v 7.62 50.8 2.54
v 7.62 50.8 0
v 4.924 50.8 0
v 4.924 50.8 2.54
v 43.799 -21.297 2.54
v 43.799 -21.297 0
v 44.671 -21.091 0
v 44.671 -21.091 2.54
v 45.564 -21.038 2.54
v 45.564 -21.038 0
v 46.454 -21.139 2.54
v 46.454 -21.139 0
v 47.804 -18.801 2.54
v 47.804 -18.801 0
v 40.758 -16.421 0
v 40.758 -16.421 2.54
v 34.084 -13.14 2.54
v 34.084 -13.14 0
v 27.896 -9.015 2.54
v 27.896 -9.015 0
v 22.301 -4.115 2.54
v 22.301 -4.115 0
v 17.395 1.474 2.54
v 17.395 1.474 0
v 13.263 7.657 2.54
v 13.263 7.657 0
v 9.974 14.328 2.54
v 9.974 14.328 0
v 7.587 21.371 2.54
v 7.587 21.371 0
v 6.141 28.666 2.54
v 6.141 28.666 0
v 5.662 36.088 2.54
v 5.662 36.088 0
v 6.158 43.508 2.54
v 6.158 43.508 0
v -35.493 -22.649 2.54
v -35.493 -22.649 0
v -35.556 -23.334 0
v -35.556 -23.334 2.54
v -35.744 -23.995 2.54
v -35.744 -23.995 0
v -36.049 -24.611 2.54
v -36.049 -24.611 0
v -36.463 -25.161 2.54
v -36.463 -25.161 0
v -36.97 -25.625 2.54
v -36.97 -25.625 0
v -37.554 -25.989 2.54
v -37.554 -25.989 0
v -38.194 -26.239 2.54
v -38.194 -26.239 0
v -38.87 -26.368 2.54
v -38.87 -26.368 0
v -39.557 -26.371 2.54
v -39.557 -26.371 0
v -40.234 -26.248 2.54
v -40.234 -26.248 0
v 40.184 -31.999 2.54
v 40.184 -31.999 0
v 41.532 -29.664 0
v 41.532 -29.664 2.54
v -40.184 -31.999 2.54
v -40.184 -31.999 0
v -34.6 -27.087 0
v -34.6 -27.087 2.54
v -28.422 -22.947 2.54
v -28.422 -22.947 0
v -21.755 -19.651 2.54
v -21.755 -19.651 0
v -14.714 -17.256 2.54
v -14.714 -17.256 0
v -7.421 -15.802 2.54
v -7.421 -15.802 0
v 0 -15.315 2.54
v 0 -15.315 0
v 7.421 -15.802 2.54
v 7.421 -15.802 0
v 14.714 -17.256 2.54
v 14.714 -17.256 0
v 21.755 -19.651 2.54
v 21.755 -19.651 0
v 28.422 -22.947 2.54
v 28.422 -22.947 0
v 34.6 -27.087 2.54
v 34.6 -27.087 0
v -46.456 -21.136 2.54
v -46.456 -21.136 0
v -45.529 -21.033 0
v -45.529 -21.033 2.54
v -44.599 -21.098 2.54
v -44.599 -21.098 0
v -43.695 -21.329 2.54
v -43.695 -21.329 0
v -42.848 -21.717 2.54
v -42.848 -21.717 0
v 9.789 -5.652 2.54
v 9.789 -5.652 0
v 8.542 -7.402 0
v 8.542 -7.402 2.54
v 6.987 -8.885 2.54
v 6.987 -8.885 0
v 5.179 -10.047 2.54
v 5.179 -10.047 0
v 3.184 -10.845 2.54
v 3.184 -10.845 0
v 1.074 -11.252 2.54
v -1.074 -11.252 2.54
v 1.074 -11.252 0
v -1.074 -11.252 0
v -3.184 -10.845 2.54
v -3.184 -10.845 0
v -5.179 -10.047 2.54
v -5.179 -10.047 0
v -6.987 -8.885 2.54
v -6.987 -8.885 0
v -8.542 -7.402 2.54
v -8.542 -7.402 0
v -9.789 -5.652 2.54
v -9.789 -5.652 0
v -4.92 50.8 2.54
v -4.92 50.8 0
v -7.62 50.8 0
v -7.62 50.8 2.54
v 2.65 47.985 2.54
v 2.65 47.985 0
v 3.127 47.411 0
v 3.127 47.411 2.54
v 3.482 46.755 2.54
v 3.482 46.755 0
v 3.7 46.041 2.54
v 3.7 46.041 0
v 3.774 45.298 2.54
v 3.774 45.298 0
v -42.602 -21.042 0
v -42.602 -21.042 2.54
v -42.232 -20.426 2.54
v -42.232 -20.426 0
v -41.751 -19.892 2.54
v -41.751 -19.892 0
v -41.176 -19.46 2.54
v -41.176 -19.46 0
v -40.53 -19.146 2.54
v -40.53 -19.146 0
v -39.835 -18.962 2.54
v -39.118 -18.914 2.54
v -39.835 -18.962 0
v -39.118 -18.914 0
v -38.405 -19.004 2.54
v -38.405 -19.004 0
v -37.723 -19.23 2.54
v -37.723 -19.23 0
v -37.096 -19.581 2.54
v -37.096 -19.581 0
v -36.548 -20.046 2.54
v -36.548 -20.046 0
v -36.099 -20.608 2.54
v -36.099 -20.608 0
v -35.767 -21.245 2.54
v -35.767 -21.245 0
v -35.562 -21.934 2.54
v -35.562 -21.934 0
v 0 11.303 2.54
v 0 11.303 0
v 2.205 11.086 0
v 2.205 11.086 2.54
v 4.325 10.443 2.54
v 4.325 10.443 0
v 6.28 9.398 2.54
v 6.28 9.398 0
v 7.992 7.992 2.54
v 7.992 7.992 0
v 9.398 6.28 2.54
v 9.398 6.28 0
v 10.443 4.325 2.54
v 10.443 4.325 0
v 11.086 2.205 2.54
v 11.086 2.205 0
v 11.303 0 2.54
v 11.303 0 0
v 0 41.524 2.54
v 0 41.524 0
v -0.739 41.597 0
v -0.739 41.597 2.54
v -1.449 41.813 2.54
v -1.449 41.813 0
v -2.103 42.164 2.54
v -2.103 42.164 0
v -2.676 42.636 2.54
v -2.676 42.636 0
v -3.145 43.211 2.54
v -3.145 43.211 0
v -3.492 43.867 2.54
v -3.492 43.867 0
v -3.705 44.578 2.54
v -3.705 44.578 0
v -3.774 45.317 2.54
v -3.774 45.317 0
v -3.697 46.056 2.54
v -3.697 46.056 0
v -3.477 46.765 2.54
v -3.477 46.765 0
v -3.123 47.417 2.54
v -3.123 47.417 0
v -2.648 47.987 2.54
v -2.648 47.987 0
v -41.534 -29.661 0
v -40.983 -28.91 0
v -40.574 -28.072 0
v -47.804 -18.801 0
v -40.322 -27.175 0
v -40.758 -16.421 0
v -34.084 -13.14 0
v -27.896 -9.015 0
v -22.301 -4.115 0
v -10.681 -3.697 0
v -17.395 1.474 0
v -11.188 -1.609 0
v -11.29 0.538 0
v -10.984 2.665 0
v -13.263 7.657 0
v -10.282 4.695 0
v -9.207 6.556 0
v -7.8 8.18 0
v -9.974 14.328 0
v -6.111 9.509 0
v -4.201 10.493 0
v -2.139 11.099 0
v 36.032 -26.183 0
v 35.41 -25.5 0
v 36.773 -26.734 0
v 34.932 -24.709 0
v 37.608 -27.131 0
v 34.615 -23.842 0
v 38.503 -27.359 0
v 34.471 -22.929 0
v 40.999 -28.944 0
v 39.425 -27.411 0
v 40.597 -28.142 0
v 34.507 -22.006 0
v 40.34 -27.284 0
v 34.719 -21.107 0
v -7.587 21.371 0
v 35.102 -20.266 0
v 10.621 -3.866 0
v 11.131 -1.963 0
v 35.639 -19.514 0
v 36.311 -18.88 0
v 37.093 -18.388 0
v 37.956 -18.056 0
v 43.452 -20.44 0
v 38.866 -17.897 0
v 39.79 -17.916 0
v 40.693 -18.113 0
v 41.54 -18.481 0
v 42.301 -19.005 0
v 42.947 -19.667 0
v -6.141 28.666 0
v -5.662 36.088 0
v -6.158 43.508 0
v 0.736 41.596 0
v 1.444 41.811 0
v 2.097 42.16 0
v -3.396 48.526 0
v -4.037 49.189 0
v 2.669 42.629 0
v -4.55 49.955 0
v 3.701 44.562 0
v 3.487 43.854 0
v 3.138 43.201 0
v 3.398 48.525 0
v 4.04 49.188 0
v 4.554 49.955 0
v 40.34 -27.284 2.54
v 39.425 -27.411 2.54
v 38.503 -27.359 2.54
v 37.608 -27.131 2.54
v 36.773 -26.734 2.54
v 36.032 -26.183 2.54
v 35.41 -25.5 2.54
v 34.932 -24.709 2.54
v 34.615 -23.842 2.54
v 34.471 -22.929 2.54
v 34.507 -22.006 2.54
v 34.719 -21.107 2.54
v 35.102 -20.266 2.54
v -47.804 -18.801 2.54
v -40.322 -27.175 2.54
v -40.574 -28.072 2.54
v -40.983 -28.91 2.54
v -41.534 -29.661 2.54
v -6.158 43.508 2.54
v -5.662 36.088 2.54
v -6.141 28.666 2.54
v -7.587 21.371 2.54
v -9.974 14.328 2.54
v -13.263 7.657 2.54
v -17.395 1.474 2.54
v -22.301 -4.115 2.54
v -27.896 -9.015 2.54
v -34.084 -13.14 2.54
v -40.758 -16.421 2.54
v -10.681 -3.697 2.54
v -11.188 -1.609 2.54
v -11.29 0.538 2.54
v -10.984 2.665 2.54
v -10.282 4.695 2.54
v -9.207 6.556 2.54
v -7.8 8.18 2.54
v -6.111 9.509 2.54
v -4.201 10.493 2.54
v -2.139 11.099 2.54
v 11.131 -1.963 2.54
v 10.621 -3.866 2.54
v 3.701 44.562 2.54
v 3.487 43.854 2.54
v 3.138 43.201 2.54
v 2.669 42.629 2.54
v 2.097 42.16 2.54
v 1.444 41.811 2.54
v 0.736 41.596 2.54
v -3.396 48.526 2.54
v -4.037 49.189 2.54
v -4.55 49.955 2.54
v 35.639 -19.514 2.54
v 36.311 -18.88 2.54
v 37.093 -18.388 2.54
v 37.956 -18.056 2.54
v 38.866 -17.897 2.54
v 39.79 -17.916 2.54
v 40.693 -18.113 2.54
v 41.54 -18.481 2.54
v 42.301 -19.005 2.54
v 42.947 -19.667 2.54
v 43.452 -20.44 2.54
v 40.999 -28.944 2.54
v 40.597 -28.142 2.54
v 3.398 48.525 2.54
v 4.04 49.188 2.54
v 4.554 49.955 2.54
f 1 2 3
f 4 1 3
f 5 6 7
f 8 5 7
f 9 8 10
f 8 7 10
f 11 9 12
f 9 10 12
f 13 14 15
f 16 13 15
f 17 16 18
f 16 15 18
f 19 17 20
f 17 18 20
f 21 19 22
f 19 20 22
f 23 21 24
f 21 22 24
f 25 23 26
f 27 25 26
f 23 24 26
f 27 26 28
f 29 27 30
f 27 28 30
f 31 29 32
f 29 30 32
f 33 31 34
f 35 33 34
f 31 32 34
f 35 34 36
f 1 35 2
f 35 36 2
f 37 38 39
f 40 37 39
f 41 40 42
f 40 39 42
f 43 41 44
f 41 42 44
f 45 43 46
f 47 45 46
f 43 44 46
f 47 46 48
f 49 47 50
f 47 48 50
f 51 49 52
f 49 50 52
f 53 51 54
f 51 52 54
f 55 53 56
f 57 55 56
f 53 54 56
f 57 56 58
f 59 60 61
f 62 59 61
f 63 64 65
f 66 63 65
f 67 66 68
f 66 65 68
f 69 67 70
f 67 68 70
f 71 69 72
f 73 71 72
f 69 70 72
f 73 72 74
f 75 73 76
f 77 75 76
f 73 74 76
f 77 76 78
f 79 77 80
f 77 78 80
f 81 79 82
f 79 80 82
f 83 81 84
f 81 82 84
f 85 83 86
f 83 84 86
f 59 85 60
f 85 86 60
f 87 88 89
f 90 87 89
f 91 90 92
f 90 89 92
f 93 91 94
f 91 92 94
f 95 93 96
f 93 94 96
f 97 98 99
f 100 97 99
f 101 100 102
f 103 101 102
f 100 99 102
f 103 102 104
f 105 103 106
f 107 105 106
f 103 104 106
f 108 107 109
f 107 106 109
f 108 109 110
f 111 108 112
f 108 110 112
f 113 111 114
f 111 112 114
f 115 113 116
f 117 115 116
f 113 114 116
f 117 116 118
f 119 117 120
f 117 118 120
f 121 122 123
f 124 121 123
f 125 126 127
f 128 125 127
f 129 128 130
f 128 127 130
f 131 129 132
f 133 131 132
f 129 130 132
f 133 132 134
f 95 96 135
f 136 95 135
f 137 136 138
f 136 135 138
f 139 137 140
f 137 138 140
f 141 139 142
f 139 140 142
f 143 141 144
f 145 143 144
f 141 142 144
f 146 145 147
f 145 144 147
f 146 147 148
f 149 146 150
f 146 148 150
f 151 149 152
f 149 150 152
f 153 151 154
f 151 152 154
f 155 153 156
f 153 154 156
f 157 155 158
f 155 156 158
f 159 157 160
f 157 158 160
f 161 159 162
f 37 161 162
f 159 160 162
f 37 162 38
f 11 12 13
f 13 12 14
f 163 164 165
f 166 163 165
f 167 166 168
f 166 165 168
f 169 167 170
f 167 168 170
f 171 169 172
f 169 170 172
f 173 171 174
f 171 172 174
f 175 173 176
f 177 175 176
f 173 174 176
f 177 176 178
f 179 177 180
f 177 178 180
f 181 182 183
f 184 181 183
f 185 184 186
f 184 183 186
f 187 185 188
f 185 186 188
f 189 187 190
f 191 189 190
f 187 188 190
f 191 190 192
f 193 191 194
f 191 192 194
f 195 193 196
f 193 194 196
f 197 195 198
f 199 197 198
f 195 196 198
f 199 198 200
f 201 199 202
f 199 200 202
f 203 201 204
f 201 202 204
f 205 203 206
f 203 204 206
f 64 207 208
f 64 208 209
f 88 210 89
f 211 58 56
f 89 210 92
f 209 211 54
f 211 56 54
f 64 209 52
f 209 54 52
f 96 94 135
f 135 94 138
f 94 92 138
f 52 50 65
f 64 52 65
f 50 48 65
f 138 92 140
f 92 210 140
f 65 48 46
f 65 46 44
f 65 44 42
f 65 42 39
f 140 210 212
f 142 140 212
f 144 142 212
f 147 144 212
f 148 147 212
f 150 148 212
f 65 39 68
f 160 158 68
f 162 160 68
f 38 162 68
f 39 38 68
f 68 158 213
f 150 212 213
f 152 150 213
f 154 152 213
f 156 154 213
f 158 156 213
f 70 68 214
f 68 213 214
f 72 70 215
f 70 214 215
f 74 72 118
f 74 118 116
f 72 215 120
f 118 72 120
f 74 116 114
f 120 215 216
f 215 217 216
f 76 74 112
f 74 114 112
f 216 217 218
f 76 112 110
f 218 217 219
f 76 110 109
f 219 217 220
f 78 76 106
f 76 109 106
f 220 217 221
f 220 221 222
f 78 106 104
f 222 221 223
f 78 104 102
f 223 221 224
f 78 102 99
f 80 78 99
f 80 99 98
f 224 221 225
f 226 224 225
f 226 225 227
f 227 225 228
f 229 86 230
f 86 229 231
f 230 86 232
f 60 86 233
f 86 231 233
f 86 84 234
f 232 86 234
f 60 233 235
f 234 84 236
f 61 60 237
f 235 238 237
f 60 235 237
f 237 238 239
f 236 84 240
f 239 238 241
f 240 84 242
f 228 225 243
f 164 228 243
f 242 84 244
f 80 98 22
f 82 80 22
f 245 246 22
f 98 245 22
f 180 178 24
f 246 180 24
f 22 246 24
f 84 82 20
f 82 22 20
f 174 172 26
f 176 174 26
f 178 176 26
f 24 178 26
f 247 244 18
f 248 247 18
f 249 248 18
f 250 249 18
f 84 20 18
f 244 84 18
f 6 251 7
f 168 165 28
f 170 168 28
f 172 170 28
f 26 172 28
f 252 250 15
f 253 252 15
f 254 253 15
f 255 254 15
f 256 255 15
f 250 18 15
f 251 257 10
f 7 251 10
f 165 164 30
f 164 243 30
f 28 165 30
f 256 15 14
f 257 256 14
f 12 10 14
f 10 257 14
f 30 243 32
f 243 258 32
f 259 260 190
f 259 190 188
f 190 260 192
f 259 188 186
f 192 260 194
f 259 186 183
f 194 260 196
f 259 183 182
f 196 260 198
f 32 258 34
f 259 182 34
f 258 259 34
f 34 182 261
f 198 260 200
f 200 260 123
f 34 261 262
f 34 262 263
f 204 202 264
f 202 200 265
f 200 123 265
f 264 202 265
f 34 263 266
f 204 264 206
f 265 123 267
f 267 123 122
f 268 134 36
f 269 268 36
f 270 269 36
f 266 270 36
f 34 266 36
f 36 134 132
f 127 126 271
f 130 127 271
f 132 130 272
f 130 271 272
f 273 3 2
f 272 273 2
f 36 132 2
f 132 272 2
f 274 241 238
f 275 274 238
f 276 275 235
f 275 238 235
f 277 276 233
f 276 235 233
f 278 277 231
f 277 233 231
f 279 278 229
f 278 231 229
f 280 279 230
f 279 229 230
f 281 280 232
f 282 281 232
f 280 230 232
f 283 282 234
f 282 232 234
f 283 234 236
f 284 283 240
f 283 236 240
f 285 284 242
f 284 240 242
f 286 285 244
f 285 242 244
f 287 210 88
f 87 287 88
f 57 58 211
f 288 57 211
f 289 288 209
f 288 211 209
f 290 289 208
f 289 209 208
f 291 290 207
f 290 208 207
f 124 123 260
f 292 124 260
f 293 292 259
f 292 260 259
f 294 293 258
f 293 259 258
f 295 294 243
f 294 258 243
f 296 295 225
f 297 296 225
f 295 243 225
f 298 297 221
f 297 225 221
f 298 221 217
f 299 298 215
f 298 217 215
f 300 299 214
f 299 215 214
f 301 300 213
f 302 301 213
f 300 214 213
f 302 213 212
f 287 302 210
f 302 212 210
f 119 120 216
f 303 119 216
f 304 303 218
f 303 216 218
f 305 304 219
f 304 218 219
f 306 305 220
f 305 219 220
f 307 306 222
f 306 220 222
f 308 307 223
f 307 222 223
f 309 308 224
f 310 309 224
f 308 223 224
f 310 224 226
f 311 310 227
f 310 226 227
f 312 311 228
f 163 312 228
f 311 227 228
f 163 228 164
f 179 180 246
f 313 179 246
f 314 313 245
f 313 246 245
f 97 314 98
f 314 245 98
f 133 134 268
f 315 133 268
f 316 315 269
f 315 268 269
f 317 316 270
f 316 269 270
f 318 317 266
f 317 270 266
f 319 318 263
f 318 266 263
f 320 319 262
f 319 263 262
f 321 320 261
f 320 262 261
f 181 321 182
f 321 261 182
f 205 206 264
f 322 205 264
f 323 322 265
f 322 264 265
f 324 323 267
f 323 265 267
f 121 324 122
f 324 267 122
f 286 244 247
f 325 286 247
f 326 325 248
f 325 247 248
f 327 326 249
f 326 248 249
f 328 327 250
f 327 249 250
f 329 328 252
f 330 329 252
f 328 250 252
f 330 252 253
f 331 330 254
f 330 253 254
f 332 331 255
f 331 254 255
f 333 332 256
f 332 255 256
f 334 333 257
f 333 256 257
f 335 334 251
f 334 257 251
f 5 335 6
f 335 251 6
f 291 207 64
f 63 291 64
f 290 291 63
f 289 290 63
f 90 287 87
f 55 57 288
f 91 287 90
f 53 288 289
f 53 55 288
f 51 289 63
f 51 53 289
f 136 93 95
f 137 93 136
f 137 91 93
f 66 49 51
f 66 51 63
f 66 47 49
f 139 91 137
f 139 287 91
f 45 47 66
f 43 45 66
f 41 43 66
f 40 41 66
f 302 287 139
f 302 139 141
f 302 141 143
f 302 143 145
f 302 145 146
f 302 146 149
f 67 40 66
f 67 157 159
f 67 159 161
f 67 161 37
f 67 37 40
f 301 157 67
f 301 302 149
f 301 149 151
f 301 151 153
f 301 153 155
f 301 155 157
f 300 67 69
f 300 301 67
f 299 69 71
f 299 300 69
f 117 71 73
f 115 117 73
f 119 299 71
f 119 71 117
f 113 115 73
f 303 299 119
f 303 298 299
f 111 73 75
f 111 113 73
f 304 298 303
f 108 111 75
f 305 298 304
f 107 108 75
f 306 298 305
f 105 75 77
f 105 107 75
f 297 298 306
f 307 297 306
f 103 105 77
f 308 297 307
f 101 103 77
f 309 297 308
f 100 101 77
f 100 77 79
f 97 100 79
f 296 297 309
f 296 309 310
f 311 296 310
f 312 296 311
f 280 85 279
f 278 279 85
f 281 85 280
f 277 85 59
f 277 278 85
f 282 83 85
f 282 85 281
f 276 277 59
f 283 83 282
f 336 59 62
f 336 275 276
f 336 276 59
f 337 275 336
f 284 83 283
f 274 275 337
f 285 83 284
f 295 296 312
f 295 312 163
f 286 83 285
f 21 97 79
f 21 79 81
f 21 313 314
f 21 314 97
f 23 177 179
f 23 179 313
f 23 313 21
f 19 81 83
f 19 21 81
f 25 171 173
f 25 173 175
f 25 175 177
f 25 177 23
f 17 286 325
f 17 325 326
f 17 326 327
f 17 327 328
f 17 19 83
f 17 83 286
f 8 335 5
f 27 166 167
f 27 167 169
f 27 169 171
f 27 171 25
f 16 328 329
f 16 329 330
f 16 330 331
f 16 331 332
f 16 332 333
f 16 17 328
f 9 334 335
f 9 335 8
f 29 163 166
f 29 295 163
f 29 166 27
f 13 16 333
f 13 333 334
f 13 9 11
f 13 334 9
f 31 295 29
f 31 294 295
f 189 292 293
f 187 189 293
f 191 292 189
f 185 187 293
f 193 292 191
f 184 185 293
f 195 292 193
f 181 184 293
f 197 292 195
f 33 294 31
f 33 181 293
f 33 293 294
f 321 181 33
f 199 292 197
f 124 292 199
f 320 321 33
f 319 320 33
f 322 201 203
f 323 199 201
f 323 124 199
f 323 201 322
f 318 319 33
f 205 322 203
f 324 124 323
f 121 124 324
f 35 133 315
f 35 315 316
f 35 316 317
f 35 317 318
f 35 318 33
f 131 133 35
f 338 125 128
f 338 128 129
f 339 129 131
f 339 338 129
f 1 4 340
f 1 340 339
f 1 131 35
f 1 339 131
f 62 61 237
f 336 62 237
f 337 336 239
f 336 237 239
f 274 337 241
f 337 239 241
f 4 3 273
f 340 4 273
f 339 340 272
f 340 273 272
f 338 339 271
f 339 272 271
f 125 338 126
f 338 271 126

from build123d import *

# Parameters (mm, degrees)
F1_DEPTH = 2.54


with BuildPart() as f1:
    # F0 (on Top) → F1 (new body)
    with BuildSketch(Plane.XY):
        with BuildLine():
            ThreePointArc((-11.5484487595, -6.6675), (-11.5484487595, 6.6675), (0, 13.335))
            Line((0, 13.335), (0, 41.5238420934))
            ThreePointArc((0, 41.5238420934), (-3.4923003016, 43.8671250358), (-2.6478593482, 47.9870832663))
            ThreePointArc((-2.6478593482, 47.9870832663), (-4.0365508418, 49.1893730793), (-4.9196396151, 50.8))
            Line((-4.9196396151, 50.8), (-7.62, 50.8))
            ThreePointArc((-7.62, 50.8), (-13.2627477276, 7.6572509707), (-47.8040905122, -18.8008864232))
            Line((-47.8040905122, -18.8008864232), (-46.456170155, -21.1355529664))
            ThreePointArc((-46.456170155, -21.1355529664), (-44.598962502, -21.0983297604), (-42.8475396736, -21.7172998002))
            ThreePointArc((-42.8475396736, -21.7172998002), (-39.7349535137, -18.946869689), (-35.9932219183, -20.7806963635))
            Line((-35.9932219183, -20.7806963635), (-11.5484487595, -6.6675))
        make_face()
        with BuildLine():
            ThreePointArc((0, 13.335), (9.4292689271, 9.4292689271), (13.335, 0))
            ThreePointArc((13.335, 0), (12.8806208936, -3.4513519664), (11.5484487595, -6.6675))
            Line((11.5484487595, -6.6675), (35.1015943461, -20.2659149447))
            ThreePointArc((35.1015943461, -20.2659149447), (39.7899129003, -17.9160164205), (43.7992079136, -21.2965352321))
            ThreePointArc((43.7992079136, -21.2965352321), (45.116331258, -21.045134002), (46.4539103198, -21.1394671159))
            Line((46.4539103198, -21.1394671159), (47.8040905122, -18.8008864232))
            ThreePointArc((47.8040905122, -18.8008864232), (13.2627477276, 7.6572509707), (7.62, 50.8))
            Line((7.62, 50.8), (4.9241592856, 50.8))
            ThreePointArc((4.9241592856, 50.8), (4.0400398552, 49.1880973327), (2.6495579427, 47.9854097477))
            ThreePointArc((2.6495579427, 47.9854097477), (3.4815648437, 46.7545040826), (3.77400783, 45.2978499234))
            ThreePointArc((3.77400783, 45.2978499234), (2.6686265288, 42.6292233945), (0, 41.5238420934))
            Line((0, 41.5238420934), (0, 13.335))
        make_face()
        with BuildLine():
            ThreePointArc((-11.5484487595, -6.6675), (0, -13.335), (11.5484487595, -6.6675))
            Line((11.5484487595, -6.6675), (9.788685139, -5.6515))
            ThreePointArc((9.788685139, -5.6515), (0, -11.303), (-9.788685139, -5.6515))
            Line((-9.788685139, -5.6515), (-11.5484487595, -6.6675))
        make_face()
        with BuildLine():
            Line((35.1015943461, -20.2659149447), (11.5484487595, -6.6675))
            ThreePointArc((11.5484487595, -6.6675), (0, -13.335), (-11.5484487595, -6.6675))
            Line((-11.5484487595, -6.6675), (-35.9932219183, -20.7806963635))
            ThreePointArc((-35.9932219183, -20.7806963635), (-35.6199482657, -21.6818586781), (-35.4926315741, -22.6489249617))
            ThreePointArc((-35.4926315741, -22.6489249617), (-36.9699808664, -25.6250875678), (-40.2337772061, -26.2477738787))
            ThreePointArc((-40.2337772061, -26.2477738787), (-40.5740144012, -28.0722881249), (-41.5342707047, -29.6605328841))
            Line((-41.5342707047, -29.6605328841), (-40.1840905122, -31.9991135768))
            ThreePointArc((-40.1840905122, -31.9991135768), (0, -15.3145019414), (40.1840905122, -31.9991135768))
            Line((40.1840905122, -31.9991135768), (41.5320108695, -29.6644470336))
            ThreePointArc((41.5320108695, -29.6644470336), (40.7807919893, -28.5517697437), (40.3400163627, -27.2836619389))
            ThreePointArc((40.3400163627, -27.2836619389), (35.4097809691, -25.4998607522), (35.1015943461, -20.2659149447))
        make_face()
        with BuildLine():
            ThreePointArc((11.5484487595, -6.6675), (12.8806208936, -3.4513519664), (13.335, 0))
            ThreePointArc((13.335, 0), (9.4292689271, 9.4292689271), (0, 13.335))
            Line((0, 13.335), (0, 11.303))
            ThreePointArc((0, 11.303), (7.9924279478, 7.9924279478), (11.303, 0))
            ThreePointArc((11.303, 0), (10.9178596145, -2.9254316668), (9.788685139, -5.6515))
            Line((9.788685139, -5.6515), (11.5484487595, -6.6675))
        make_face()
        with BuildLine():
            Line((0, 11.303), (0, 13.335))
            ThreePointArc((0, 13.335), (-11.5484487595, 6.6675), (-11.5484487595, -6.6675))
            Line((-11.5484487595, -6.6675), (-9.788685139, -5.6515))
            ThreePointArc((-9.788685139, -5.6515), (-9.788685139, 5.6515), (0, 11.303))
        make_face()
    extrude(amount=F1_DEPTH)


solid = f1.part
